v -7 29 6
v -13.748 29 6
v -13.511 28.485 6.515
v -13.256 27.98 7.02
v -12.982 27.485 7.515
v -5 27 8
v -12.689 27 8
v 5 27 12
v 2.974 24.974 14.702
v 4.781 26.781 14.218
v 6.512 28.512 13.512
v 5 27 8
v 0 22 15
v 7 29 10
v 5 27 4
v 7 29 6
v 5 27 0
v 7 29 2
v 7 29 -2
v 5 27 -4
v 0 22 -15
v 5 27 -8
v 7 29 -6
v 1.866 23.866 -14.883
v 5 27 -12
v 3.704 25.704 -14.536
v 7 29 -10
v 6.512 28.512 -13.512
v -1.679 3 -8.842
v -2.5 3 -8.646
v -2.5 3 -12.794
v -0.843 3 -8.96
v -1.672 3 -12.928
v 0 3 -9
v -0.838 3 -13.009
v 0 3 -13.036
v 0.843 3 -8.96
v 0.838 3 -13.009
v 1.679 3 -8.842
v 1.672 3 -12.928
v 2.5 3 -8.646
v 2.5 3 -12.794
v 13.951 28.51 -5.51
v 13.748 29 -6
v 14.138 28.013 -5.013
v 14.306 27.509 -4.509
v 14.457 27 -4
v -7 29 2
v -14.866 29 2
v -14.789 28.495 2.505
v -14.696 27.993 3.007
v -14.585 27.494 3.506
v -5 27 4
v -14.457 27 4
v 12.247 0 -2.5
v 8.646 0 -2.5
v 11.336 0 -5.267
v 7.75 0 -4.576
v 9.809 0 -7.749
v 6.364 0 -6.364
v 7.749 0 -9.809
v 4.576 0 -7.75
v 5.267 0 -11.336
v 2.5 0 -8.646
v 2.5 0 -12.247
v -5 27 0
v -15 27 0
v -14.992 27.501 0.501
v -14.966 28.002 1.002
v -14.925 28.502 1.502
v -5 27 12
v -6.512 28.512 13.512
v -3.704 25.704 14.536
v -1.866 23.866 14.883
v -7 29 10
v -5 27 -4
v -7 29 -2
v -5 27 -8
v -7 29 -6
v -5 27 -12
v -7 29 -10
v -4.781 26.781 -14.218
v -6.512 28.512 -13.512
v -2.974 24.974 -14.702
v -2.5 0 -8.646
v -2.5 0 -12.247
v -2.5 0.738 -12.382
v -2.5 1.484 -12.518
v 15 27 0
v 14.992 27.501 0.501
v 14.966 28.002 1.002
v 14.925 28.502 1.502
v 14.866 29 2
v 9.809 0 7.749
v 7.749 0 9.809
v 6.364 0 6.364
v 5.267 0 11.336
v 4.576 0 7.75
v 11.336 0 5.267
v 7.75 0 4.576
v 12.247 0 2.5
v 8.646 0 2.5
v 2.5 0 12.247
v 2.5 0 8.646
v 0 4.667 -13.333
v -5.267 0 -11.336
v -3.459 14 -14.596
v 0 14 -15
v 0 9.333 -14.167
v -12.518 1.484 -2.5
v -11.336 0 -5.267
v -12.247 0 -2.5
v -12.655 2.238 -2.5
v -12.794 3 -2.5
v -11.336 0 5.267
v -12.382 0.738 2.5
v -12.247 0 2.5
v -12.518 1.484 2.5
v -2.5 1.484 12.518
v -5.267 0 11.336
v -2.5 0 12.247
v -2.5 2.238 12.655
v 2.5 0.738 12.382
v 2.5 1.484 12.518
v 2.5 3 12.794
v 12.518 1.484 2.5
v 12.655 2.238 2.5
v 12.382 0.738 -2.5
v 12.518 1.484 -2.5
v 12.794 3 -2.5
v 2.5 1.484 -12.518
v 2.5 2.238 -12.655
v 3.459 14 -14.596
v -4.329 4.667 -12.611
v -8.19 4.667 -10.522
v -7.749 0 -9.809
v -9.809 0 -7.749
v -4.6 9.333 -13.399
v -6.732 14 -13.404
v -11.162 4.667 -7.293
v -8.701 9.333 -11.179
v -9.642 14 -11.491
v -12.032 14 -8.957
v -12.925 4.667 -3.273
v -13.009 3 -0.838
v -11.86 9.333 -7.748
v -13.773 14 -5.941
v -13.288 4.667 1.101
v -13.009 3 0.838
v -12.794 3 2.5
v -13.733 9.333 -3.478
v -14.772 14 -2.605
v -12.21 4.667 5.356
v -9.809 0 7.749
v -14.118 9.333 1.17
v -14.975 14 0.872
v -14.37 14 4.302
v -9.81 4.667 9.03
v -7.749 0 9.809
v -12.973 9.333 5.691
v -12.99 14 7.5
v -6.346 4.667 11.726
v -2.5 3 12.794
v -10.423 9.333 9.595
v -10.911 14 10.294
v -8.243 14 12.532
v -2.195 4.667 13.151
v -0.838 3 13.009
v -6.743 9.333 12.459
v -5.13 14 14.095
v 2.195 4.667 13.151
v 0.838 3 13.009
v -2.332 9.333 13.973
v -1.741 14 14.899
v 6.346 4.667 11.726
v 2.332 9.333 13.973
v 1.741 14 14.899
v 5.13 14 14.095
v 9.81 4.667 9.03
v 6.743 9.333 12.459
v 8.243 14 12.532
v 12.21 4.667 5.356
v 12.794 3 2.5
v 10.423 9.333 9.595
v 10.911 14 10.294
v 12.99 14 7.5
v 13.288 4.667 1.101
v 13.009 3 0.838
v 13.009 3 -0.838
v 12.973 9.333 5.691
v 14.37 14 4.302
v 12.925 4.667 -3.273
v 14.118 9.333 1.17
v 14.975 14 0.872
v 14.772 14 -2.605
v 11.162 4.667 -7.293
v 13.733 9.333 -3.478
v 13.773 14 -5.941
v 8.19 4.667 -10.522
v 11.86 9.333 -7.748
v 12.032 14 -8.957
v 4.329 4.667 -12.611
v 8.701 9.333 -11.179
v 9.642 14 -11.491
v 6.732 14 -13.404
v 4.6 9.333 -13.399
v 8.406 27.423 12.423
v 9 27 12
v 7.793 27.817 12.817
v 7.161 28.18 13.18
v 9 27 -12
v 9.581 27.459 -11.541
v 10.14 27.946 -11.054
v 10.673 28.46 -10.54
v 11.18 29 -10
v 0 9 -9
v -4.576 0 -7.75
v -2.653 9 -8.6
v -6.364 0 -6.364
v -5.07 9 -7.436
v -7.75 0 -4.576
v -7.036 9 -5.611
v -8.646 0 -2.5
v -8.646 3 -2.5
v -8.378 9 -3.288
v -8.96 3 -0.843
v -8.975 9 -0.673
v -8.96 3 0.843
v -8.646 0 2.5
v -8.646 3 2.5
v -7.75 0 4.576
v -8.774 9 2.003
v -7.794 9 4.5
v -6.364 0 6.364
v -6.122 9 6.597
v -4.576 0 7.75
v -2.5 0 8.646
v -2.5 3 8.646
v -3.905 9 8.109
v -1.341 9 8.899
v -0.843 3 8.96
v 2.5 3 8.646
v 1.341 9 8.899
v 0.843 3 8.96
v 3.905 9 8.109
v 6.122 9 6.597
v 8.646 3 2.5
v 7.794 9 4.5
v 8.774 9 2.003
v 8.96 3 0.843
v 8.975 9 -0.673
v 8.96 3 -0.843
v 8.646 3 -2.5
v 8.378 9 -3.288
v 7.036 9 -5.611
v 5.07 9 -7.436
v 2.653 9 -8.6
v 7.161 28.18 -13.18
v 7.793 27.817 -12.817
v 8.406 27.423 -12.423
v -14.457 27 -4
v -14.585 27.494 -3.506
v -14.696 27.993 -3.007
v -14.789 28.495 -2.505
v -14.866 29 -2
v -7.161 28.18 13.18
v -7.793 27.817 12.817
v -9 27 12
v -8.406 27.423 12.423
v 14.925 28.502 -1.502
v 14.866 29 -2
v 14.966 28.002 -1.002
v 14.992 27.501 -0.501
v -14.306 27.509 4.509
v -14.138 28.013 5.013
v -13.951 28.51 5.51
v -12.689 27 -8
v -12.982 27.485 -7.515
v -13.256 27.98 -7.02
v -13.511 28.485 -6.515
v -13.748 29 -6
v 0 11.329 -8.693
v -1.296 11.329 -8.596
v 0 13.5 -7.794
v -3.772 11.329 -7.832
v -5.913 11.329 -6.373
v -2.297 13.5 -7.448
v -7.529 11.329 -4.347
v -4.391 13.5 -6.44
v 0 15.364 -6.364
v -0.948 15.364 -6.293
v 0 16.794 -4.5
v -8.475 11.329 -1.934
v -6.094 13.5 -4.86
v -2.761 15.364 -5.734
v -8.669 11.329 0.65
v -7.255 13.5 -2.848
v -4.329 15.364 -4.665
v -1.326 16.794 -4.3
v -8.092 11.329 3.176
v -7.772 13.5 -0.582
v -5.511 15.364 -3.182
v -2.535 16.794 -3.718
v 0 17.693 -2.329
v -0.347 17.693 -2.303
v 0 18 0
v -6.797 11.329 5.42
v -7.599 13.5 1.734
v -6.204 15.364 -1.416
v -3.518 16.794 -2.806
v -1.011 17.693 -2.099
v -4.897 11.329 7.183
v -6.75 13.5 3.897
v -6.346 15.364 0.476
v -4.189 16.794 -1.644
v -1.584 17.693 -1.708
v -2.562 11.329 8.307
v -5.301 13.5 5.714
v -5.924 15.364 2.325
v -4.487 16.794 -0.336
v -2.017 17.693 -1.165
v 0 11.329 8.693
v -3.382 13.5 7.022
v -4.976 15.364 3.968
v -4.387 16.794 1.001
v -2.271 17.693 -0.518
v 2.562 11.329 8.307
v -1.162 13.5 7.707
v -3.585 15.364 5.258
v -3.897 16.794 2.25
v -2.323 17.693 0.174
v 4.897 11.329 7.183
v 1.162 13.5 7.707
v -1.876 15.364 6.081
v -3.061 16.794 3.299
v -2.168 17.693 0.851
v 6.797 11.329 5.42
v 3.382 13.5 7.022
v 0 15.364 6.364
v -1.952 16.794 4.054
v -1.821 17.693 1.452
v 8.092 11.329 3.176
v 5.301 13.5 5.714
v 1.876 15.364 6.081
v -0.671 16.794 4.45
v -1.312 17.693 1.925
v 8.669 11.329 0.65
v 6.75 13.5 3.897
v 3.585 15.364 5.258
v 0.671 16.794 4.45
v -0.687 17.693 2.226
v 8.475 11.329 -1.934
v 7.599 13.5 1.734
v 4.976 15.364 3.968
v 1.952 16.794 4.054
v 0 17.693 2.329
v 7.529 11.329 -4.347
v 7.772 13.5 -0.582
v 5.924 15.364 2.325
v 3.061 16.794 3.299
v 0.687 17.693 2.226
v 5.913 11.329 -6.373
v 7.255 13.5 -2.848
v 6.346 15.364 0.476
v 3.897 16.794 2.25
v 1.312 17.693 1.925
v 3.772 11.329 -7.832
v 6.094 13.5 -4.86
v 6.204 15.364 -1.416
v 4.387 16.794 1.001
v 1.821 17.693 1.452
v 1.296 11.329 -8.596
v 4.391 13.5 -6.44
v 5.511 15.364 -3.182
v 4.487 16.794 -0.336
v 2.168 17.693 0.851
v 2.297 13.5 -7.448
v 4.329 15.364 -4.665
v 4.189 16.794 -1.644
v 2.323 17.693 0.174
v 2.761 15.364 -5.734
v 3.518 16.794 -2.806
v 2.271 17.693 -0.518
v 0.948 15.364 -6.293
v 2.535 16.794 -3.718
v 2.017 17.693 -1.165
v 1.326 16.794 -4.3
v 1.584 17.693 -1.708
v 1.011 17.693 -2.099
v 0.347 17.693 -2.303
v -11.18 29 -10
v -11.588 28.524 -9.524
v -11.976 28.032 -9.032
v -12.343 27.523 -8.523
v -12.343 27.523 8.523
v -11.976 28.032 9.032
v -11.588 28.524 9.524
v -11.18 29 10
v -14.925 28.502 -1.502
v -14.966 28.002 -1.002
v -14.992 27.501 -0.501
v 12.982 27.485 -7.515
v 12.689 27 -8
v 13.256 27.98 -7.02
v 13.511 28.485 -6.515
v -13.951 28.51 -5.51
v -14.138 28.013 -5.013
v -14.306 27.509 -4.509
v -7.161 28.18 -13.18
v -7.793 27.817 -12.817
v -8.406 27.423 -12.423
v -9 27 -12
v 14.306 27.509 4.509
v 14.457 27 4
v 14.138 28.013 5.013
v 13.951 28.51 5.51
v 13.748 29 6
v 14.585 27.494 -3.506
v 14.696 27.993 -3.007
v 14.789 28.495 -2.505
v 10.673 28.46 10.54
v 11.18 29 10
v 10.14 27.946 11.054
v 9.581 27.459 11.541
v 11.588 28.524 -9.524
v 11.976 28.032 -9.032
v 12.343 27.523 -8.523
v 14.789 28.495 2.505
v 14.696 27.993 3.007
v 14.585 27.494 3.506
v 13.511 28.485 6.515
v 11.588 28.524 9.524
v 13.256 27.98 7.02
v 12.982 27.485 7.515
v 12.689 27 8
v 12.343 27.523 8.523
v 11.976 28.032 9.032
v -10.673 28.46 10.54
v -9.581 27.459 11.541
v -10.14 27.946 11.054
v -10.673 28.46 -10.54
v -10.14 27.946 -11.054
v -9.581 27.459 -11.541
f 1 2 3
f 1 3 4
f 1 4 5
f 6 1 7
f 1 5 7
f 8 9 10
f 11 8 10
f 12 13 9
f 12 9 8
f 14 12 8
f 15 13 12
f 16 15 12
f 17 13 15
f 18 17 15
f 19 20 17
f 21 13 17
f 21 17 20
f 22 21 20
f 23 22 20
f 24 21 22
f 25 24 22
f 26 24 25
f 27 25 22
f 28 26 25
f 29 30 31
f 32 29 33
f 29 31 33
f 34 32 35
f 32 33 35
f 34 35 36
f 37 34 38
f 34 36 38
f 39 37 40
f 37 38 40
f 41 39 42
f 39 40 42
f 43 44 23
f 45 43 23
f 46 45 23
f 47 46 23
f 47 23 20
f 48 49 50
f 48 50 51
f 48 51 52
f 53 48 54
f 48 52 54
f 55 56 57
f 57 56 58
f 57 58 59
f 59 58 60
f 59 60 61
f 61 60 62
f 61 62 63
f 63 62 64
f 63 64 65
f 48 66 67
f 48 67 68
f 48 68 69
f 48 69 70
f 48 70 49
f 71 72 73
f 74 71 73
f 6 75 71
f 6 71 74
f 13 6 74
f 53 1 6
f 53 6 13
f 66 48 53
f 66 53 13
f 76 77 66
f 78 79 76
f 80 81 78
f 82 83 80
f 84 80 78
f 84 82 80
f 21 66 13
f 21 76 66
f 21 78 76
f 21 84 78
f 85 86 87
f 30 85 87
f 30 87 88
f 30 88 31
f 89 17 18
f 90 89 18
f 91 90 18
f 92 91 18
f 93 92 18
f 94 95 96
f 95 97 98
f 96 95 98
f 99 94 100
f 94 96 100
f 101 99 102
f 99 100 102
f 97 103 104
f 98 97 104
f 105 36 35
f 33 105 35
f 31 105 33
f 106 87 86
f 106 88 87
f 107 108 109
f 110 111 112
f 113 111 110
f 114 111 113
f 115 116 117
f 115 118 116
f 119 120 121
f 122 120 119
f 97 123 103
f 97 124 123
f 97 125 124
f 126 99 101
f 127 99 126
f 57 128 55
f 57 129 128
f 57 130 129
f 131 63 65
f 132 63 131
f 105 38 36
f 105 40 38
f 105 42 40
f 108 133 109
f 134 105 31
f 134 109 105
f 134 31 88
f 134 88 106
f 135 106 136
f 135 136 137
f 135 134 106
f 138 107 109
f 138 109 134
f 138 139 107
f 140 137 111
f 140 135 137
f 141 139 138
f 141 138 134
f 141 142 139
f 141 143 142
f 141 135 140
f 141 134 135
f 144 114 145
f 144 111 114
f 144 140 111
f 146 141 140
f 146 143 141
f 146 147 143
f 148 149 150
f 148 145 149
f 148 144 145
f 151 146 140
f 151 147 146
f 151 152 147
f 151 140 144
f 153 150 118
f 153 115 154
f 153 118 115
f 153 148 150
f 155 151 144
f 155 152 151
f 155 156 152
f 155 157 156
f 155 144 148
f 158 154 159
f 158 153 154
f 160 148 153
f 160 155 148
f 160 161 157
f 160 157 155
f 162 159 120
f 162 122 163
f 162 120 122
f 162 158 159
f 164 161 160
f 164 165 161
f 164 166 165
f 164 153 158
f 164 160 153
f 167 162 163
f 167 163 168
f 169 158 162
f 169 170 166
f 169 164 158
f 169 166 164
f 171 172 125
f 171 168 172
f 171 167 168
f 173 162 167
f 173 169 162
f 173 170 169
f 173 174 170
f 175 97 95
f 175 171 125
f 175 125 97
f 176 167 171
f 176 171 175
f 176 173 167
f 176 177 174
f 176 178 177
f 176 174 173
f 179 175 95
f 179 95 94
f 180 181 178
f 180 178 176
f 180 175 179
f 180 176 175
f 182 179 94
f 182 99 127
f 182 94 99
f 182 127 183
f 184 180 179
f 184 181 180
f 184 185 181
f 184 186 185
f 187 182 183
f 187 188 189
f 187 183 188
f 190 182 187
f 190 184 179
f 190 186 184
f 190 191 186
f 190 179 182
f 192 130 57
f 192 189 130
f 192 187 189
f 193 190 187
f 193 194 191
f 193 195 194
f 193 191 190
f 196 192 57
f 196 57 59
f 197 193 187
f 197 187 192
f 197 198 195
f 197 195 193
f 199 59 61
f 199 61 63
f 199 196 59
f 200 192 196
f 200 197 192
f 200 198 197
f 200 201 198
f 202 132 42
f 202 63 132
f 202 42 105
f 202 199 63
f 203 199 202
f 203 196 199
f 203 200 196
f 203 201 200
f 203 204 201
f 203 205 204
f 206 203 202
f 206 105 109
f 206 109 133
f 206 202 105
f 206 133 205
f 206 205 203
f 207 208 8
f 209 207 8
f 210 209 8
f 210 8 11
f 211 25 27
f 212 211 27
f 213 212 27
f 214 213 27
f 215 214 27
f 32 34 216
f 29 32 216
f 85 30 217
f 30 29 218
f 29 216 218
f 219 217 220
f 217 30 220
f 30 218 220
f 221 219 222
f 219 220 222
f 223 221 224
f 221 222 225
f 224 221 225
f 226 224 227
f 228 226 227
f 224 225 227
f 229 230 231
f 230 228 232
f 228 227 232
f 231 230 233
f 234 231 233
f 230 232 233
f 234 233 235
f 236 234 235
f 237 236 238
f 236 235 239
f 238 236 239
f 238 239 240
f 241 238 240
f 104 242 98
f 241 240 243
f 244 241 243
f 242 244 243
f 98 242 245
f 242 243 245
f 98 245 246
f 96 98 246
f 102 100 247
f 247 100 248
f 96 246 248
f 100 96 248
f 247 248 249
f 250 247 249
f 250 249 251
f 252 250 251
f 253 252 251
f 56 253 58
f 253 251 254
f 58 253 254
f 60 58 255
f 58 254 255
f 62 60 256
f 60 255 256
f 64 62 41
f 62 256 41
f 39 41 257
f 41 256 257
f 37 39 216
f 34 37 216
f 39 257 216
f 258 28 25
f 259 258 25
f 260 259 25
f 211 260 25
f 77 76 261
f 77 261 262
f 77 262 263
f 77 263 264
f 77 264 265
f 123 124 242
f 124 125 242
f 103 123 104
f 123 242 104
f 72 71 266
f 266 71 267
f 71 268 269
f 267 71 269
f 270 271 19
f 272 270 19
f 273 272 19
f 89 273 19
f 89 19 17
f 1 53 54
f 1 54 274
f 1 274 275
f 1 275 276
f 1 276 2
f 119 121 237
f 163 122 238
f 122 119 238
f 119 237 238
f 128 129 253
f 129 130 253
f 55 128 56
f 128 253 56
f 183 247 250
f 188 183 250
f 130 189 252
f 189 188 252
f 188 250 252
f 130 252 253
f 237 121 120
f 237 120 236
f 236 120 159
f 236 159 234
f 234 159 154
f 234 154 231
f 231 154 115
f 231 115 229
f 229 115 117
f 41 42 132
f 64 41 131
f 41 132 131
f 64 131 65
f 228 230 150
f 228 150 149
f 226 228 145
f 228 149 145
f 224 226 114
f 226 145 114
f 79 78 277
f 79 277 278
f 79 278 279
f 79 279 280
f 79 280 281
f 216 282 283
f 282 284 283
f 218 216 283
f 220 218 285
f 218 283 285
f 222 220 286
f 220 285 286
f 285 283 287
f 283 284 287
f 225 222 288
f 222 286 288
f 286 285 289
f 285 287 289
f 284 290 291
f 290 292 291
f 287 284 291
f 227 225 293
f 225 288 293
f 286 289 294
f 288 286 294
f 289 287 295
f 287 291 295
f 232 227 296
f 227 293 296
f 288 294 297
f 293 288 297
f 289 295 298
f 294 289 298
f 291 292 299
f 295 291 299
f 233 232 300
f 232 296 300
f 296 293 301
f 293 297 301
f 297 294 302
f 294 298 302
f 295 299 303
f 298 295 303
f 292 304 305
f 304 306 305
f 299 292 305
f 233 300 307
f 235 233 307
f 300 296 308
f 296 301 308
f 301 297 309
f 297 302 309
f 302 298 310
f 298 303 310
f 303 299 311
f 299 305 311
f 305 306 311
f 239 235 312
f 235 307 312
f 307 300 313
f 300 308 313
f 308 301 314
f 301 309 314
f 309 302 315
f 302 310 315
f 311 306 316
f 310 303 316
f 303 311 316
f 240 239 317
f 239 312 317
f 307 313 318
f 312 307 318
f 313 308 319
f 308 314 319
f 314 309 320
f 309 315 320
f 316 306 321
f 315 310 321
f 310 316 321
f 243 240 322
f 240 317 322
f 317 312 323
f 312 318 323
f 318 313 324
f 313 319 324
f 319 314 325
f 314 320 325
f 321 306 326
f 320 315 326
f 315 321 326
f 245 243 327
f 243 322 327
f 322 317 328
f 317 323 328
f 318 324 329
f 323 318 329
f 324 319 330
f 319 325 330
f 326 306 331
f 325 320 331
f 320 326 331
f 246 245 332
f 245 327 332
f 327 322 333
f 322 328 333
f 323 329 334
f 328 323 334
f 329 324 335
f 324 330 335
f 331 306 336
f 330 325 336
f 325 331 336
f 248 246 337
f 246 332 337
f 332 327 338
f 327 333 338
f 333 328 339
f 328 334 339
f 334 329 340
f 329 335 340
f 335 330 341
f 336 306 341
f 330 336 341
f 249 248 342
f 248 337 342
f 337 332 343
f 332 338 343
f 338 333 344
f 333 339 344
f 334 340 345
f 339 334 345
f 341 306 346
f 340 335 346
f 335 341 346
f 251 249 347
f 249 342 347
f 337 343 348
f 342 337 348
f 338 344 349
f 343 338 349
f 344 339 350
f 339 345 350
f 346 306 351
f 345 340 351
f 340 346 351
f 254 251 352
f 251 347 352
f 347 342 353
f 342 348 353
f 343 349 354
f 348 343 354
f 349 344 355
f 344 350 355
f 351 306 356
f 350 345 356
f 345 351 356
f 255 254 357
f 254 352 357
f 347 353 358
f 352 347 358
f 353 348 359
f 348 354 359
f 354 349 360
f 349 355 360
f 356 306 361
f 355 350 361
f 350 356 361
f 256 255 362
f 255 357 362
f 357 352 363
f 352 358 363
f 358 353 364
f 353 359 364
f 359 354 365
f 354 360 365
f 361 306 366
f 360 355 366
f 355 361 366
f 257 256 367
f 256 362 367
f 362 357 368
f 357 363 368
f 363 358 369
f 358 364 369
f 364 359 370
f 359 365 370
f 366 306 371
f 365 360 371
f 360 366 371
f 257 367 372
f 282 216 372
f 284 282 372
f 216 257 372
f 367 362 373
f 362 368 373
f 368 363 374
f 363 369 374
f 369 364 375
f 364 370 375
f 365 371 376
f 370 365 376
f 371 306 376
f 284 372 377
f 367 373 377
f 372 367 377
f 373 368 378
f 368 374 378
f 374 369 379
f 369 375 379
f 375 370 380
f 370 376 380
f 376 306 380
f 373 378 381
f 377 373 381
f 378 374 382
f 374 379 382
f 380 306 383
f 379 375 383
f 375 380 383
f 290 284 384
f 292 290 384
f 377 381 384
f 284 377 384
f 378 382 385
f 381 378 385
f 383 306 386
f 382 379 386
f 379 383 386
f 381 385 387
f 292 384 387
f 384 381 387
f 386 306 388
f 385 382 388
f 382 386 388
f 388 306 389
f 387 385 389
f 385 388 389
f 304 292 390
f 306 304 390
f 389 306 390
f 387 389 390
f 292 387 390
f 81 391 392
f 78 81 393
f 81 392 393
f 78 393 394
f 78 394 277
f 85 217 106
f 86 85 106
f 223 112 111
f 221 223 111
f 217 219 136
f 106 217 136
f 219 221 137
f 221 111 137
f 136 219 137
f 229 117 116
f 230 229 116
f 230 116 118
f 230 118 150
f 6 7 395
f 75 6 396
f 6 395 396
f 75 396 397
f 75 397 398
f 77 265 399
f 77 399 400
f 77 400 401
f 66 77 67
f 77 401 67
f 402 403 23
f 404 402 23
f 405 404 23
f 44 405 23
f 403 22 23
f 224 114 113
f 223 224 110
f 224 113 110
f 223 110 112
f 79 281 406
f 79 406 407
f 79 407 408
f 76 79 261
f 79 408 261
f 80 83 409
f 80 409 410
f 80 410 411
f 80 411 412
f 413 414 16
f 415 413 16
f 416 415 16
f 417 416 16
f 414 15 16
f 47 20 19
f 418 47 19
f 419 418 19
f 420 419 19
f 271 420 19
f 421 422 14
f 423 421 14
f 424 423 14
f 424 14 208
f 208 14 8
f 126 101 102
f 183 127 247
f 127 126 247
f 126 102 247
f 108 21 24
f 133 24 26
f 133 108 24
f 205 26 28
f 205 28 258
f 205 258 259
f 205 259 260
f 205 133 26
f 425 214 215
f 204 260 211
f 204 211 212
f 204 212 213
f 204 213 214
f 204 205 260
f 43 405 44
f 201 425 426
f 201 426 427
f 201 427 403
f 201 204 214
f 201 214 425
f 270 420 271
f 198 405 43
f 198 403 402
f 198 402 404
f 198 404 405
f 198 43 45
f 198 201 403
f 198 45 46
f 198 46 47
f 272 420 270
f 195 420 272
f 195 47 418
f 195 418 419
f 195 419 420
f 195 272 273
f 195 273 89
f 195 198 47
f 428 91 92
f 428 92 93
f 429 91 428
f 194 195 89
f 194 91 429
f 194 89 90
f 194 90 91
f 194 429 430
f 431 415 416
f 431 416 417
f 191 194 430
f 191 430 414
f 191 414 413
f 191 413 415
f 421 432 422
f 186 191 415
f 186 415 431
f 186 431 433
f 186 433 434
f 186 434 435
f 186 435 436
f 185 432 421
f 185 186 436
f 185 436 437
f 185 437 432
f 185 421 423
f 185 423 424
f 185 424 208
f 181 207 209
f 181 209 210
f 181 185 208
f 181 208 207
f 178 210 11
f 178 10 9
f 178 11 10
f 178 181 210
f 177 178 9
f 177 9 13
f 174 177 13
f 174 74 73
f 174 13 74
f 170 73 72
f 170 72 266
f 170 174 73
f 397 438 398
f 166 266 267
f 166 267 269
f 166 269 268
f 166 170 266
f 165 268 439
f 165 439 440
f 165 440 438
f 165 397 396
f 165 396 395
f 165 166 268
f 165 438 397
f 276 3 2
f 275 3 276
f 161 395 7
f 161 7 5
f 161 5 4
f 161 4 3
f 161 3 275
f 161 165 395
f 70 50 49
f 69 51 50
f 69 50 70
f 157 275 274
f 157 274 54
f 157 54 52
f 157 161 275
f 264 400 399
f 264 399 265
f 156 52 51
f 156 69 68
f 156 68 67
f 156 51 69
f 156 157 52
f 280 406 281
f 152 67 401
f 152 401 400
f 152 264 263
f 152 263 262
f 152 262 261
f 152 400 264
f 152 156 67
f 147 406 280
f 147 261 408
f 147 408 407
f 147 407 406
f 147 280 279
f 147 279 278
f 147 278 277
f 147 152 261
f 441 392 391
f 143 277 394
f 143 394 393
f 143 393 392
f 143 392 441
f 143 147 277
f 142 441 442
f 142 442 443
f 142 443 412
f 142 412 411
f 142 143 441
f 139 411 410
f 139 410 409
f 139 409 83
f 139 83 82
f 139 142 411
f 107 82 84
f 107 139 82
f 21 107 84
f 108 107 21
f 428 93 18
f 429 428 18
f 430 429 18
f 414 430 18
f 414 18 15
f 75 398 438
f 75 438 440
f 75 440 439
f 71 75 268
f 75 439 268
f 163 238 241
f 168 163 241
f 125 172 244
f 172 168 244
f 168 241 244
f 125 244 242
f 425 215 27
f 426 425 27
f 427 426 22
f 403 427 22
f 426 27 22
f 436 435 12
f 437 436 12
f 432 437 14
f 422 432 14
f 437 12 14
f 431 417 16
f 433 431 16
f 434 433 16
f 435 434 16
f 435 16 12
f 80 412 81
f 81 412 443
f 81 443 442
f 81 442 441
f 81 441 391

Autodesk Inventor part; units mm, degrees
ref_plane "YZ Plane" through (0, 0, 0) normal (1, 0, 0) x (0, 1, 0)
ref_plane "XZ Plane" through (0, 0, 0) normal (0, 1, 0) x (-1, 0, 0)
ref_plane "XY Plane" through (0, 0, 0) normal (0, 0, 1) x (1, 0, 0)
sketch "Esboço1" plane through (0, 0, 0) normal (1, 0, 0) x (0, 1, 0)
  line L0 (0, 0) -> (29, 0)
  line L1 (29, 0) -> (29, -15)
  line L2 (29, -15) -> (14, -15)
  line L3 (14, -15) -> (0, -12.5)
  line L4 (0, -12.5) -> (0, -9)
  line L5 (0, -9) -> (9.7213, -9)
  arc A0 (9, -9) -> (18, 0) centre (9, 0) ccw
  point P0 (4.8606, -9)
  dimension "d0" = 15
  dimension "d1" = 12.5
  dimension "d2" = 15
  dimension "d3" = 29
  dimension "d5" = 9
  dimension "d7" = 9
revolve "Revolução1" add sketch "Esboço1" angle 360 about axis through (0, 0, 0) along (0, 1, 0)
sketch "Esboço2" plane through (0, 0, 0) normal (0, 0, 1) x (1, 0, 0)
  line L0 (0, 0) -> (0, 39.2335)
  line L1 (-2.5, 3) -> (2.5, 3)
  line L2 (2.5, 3) -> (2.5, -0.6056)
  line L3 (2.5, -0.6056) -> (-2.5, -0.6056)
  line L4 (-2.5, -0.6056) -> (-2.5, 3)
  line L5 (12.5, 0) -> (-12.5, 0) projected
  dimension "d9" = 5
  dimension "d10" = 2.5
  dimension "d11" = 3
extrude "Extrusão1" cut sketch "Esboço2" along normal through all both and the other way through all
pattern_circular "Padrão circular1" count 4 over 360 about axis through (0, 21.5, 0) along (0, 1, 0) of "Extrusão1"
sketch "Esboço3" plane through (0, 0, 0) normal (0, 0, 1) x (1, 0, 0)
  line L0 (15, 29) -> (-15, 29) projected
  line L1 (-7, 29) -> (0, 22)
  line L2 (0, 22) -> (7, 29)
  line L3 (-7, 29) -> (7, 29)
  line L4 (0, 29) -> (0, 9.5937)
  line L5 (2.5, 0) -> (2.5, 3) projected
  point P0 (0, 0)
  dimension "d17" = 45
  dimension "d19" = 2.5
  dimension "d20" = 7
extrude "Extrusão2" cut sketch "Esboço3" along normal through all both and the other way through all
sketch "Esboço4" plane through (0, 0, 0) normal (1, 0, 0) x (0, 1, 0)
  line L0 (29, -13.2665) -> (29, 13.2665) projected
  line L1 (29, -2) -> (27, 0)
  line L2 (27, 0) -> (29, 2)
  line L3 (29, -2) -> (29, 2)
  line L4 (3, -2.5) -> (3, 2.5) projected
  line L5 (3, 0) -> (30.8136, 0)
  point P0 (0, 0)
  dimension "d23" = 2
  dimension "d24" = 45
  dimension "d25" = 45
extrude "Extrusão3" cut sketch "Esboço4" along normal through all both and the other way through all
pattern_linear "Padrão retangular1" count 4 spacing 4 along (0, 0, 1) of "Extrusão3"
pattern_linear "Padrão retangular2" count 4 spacing 4 along (0, 0, -1) of "Extrusão3"
properties part number "CHAPEU" material "Latão, amarelo macio"
